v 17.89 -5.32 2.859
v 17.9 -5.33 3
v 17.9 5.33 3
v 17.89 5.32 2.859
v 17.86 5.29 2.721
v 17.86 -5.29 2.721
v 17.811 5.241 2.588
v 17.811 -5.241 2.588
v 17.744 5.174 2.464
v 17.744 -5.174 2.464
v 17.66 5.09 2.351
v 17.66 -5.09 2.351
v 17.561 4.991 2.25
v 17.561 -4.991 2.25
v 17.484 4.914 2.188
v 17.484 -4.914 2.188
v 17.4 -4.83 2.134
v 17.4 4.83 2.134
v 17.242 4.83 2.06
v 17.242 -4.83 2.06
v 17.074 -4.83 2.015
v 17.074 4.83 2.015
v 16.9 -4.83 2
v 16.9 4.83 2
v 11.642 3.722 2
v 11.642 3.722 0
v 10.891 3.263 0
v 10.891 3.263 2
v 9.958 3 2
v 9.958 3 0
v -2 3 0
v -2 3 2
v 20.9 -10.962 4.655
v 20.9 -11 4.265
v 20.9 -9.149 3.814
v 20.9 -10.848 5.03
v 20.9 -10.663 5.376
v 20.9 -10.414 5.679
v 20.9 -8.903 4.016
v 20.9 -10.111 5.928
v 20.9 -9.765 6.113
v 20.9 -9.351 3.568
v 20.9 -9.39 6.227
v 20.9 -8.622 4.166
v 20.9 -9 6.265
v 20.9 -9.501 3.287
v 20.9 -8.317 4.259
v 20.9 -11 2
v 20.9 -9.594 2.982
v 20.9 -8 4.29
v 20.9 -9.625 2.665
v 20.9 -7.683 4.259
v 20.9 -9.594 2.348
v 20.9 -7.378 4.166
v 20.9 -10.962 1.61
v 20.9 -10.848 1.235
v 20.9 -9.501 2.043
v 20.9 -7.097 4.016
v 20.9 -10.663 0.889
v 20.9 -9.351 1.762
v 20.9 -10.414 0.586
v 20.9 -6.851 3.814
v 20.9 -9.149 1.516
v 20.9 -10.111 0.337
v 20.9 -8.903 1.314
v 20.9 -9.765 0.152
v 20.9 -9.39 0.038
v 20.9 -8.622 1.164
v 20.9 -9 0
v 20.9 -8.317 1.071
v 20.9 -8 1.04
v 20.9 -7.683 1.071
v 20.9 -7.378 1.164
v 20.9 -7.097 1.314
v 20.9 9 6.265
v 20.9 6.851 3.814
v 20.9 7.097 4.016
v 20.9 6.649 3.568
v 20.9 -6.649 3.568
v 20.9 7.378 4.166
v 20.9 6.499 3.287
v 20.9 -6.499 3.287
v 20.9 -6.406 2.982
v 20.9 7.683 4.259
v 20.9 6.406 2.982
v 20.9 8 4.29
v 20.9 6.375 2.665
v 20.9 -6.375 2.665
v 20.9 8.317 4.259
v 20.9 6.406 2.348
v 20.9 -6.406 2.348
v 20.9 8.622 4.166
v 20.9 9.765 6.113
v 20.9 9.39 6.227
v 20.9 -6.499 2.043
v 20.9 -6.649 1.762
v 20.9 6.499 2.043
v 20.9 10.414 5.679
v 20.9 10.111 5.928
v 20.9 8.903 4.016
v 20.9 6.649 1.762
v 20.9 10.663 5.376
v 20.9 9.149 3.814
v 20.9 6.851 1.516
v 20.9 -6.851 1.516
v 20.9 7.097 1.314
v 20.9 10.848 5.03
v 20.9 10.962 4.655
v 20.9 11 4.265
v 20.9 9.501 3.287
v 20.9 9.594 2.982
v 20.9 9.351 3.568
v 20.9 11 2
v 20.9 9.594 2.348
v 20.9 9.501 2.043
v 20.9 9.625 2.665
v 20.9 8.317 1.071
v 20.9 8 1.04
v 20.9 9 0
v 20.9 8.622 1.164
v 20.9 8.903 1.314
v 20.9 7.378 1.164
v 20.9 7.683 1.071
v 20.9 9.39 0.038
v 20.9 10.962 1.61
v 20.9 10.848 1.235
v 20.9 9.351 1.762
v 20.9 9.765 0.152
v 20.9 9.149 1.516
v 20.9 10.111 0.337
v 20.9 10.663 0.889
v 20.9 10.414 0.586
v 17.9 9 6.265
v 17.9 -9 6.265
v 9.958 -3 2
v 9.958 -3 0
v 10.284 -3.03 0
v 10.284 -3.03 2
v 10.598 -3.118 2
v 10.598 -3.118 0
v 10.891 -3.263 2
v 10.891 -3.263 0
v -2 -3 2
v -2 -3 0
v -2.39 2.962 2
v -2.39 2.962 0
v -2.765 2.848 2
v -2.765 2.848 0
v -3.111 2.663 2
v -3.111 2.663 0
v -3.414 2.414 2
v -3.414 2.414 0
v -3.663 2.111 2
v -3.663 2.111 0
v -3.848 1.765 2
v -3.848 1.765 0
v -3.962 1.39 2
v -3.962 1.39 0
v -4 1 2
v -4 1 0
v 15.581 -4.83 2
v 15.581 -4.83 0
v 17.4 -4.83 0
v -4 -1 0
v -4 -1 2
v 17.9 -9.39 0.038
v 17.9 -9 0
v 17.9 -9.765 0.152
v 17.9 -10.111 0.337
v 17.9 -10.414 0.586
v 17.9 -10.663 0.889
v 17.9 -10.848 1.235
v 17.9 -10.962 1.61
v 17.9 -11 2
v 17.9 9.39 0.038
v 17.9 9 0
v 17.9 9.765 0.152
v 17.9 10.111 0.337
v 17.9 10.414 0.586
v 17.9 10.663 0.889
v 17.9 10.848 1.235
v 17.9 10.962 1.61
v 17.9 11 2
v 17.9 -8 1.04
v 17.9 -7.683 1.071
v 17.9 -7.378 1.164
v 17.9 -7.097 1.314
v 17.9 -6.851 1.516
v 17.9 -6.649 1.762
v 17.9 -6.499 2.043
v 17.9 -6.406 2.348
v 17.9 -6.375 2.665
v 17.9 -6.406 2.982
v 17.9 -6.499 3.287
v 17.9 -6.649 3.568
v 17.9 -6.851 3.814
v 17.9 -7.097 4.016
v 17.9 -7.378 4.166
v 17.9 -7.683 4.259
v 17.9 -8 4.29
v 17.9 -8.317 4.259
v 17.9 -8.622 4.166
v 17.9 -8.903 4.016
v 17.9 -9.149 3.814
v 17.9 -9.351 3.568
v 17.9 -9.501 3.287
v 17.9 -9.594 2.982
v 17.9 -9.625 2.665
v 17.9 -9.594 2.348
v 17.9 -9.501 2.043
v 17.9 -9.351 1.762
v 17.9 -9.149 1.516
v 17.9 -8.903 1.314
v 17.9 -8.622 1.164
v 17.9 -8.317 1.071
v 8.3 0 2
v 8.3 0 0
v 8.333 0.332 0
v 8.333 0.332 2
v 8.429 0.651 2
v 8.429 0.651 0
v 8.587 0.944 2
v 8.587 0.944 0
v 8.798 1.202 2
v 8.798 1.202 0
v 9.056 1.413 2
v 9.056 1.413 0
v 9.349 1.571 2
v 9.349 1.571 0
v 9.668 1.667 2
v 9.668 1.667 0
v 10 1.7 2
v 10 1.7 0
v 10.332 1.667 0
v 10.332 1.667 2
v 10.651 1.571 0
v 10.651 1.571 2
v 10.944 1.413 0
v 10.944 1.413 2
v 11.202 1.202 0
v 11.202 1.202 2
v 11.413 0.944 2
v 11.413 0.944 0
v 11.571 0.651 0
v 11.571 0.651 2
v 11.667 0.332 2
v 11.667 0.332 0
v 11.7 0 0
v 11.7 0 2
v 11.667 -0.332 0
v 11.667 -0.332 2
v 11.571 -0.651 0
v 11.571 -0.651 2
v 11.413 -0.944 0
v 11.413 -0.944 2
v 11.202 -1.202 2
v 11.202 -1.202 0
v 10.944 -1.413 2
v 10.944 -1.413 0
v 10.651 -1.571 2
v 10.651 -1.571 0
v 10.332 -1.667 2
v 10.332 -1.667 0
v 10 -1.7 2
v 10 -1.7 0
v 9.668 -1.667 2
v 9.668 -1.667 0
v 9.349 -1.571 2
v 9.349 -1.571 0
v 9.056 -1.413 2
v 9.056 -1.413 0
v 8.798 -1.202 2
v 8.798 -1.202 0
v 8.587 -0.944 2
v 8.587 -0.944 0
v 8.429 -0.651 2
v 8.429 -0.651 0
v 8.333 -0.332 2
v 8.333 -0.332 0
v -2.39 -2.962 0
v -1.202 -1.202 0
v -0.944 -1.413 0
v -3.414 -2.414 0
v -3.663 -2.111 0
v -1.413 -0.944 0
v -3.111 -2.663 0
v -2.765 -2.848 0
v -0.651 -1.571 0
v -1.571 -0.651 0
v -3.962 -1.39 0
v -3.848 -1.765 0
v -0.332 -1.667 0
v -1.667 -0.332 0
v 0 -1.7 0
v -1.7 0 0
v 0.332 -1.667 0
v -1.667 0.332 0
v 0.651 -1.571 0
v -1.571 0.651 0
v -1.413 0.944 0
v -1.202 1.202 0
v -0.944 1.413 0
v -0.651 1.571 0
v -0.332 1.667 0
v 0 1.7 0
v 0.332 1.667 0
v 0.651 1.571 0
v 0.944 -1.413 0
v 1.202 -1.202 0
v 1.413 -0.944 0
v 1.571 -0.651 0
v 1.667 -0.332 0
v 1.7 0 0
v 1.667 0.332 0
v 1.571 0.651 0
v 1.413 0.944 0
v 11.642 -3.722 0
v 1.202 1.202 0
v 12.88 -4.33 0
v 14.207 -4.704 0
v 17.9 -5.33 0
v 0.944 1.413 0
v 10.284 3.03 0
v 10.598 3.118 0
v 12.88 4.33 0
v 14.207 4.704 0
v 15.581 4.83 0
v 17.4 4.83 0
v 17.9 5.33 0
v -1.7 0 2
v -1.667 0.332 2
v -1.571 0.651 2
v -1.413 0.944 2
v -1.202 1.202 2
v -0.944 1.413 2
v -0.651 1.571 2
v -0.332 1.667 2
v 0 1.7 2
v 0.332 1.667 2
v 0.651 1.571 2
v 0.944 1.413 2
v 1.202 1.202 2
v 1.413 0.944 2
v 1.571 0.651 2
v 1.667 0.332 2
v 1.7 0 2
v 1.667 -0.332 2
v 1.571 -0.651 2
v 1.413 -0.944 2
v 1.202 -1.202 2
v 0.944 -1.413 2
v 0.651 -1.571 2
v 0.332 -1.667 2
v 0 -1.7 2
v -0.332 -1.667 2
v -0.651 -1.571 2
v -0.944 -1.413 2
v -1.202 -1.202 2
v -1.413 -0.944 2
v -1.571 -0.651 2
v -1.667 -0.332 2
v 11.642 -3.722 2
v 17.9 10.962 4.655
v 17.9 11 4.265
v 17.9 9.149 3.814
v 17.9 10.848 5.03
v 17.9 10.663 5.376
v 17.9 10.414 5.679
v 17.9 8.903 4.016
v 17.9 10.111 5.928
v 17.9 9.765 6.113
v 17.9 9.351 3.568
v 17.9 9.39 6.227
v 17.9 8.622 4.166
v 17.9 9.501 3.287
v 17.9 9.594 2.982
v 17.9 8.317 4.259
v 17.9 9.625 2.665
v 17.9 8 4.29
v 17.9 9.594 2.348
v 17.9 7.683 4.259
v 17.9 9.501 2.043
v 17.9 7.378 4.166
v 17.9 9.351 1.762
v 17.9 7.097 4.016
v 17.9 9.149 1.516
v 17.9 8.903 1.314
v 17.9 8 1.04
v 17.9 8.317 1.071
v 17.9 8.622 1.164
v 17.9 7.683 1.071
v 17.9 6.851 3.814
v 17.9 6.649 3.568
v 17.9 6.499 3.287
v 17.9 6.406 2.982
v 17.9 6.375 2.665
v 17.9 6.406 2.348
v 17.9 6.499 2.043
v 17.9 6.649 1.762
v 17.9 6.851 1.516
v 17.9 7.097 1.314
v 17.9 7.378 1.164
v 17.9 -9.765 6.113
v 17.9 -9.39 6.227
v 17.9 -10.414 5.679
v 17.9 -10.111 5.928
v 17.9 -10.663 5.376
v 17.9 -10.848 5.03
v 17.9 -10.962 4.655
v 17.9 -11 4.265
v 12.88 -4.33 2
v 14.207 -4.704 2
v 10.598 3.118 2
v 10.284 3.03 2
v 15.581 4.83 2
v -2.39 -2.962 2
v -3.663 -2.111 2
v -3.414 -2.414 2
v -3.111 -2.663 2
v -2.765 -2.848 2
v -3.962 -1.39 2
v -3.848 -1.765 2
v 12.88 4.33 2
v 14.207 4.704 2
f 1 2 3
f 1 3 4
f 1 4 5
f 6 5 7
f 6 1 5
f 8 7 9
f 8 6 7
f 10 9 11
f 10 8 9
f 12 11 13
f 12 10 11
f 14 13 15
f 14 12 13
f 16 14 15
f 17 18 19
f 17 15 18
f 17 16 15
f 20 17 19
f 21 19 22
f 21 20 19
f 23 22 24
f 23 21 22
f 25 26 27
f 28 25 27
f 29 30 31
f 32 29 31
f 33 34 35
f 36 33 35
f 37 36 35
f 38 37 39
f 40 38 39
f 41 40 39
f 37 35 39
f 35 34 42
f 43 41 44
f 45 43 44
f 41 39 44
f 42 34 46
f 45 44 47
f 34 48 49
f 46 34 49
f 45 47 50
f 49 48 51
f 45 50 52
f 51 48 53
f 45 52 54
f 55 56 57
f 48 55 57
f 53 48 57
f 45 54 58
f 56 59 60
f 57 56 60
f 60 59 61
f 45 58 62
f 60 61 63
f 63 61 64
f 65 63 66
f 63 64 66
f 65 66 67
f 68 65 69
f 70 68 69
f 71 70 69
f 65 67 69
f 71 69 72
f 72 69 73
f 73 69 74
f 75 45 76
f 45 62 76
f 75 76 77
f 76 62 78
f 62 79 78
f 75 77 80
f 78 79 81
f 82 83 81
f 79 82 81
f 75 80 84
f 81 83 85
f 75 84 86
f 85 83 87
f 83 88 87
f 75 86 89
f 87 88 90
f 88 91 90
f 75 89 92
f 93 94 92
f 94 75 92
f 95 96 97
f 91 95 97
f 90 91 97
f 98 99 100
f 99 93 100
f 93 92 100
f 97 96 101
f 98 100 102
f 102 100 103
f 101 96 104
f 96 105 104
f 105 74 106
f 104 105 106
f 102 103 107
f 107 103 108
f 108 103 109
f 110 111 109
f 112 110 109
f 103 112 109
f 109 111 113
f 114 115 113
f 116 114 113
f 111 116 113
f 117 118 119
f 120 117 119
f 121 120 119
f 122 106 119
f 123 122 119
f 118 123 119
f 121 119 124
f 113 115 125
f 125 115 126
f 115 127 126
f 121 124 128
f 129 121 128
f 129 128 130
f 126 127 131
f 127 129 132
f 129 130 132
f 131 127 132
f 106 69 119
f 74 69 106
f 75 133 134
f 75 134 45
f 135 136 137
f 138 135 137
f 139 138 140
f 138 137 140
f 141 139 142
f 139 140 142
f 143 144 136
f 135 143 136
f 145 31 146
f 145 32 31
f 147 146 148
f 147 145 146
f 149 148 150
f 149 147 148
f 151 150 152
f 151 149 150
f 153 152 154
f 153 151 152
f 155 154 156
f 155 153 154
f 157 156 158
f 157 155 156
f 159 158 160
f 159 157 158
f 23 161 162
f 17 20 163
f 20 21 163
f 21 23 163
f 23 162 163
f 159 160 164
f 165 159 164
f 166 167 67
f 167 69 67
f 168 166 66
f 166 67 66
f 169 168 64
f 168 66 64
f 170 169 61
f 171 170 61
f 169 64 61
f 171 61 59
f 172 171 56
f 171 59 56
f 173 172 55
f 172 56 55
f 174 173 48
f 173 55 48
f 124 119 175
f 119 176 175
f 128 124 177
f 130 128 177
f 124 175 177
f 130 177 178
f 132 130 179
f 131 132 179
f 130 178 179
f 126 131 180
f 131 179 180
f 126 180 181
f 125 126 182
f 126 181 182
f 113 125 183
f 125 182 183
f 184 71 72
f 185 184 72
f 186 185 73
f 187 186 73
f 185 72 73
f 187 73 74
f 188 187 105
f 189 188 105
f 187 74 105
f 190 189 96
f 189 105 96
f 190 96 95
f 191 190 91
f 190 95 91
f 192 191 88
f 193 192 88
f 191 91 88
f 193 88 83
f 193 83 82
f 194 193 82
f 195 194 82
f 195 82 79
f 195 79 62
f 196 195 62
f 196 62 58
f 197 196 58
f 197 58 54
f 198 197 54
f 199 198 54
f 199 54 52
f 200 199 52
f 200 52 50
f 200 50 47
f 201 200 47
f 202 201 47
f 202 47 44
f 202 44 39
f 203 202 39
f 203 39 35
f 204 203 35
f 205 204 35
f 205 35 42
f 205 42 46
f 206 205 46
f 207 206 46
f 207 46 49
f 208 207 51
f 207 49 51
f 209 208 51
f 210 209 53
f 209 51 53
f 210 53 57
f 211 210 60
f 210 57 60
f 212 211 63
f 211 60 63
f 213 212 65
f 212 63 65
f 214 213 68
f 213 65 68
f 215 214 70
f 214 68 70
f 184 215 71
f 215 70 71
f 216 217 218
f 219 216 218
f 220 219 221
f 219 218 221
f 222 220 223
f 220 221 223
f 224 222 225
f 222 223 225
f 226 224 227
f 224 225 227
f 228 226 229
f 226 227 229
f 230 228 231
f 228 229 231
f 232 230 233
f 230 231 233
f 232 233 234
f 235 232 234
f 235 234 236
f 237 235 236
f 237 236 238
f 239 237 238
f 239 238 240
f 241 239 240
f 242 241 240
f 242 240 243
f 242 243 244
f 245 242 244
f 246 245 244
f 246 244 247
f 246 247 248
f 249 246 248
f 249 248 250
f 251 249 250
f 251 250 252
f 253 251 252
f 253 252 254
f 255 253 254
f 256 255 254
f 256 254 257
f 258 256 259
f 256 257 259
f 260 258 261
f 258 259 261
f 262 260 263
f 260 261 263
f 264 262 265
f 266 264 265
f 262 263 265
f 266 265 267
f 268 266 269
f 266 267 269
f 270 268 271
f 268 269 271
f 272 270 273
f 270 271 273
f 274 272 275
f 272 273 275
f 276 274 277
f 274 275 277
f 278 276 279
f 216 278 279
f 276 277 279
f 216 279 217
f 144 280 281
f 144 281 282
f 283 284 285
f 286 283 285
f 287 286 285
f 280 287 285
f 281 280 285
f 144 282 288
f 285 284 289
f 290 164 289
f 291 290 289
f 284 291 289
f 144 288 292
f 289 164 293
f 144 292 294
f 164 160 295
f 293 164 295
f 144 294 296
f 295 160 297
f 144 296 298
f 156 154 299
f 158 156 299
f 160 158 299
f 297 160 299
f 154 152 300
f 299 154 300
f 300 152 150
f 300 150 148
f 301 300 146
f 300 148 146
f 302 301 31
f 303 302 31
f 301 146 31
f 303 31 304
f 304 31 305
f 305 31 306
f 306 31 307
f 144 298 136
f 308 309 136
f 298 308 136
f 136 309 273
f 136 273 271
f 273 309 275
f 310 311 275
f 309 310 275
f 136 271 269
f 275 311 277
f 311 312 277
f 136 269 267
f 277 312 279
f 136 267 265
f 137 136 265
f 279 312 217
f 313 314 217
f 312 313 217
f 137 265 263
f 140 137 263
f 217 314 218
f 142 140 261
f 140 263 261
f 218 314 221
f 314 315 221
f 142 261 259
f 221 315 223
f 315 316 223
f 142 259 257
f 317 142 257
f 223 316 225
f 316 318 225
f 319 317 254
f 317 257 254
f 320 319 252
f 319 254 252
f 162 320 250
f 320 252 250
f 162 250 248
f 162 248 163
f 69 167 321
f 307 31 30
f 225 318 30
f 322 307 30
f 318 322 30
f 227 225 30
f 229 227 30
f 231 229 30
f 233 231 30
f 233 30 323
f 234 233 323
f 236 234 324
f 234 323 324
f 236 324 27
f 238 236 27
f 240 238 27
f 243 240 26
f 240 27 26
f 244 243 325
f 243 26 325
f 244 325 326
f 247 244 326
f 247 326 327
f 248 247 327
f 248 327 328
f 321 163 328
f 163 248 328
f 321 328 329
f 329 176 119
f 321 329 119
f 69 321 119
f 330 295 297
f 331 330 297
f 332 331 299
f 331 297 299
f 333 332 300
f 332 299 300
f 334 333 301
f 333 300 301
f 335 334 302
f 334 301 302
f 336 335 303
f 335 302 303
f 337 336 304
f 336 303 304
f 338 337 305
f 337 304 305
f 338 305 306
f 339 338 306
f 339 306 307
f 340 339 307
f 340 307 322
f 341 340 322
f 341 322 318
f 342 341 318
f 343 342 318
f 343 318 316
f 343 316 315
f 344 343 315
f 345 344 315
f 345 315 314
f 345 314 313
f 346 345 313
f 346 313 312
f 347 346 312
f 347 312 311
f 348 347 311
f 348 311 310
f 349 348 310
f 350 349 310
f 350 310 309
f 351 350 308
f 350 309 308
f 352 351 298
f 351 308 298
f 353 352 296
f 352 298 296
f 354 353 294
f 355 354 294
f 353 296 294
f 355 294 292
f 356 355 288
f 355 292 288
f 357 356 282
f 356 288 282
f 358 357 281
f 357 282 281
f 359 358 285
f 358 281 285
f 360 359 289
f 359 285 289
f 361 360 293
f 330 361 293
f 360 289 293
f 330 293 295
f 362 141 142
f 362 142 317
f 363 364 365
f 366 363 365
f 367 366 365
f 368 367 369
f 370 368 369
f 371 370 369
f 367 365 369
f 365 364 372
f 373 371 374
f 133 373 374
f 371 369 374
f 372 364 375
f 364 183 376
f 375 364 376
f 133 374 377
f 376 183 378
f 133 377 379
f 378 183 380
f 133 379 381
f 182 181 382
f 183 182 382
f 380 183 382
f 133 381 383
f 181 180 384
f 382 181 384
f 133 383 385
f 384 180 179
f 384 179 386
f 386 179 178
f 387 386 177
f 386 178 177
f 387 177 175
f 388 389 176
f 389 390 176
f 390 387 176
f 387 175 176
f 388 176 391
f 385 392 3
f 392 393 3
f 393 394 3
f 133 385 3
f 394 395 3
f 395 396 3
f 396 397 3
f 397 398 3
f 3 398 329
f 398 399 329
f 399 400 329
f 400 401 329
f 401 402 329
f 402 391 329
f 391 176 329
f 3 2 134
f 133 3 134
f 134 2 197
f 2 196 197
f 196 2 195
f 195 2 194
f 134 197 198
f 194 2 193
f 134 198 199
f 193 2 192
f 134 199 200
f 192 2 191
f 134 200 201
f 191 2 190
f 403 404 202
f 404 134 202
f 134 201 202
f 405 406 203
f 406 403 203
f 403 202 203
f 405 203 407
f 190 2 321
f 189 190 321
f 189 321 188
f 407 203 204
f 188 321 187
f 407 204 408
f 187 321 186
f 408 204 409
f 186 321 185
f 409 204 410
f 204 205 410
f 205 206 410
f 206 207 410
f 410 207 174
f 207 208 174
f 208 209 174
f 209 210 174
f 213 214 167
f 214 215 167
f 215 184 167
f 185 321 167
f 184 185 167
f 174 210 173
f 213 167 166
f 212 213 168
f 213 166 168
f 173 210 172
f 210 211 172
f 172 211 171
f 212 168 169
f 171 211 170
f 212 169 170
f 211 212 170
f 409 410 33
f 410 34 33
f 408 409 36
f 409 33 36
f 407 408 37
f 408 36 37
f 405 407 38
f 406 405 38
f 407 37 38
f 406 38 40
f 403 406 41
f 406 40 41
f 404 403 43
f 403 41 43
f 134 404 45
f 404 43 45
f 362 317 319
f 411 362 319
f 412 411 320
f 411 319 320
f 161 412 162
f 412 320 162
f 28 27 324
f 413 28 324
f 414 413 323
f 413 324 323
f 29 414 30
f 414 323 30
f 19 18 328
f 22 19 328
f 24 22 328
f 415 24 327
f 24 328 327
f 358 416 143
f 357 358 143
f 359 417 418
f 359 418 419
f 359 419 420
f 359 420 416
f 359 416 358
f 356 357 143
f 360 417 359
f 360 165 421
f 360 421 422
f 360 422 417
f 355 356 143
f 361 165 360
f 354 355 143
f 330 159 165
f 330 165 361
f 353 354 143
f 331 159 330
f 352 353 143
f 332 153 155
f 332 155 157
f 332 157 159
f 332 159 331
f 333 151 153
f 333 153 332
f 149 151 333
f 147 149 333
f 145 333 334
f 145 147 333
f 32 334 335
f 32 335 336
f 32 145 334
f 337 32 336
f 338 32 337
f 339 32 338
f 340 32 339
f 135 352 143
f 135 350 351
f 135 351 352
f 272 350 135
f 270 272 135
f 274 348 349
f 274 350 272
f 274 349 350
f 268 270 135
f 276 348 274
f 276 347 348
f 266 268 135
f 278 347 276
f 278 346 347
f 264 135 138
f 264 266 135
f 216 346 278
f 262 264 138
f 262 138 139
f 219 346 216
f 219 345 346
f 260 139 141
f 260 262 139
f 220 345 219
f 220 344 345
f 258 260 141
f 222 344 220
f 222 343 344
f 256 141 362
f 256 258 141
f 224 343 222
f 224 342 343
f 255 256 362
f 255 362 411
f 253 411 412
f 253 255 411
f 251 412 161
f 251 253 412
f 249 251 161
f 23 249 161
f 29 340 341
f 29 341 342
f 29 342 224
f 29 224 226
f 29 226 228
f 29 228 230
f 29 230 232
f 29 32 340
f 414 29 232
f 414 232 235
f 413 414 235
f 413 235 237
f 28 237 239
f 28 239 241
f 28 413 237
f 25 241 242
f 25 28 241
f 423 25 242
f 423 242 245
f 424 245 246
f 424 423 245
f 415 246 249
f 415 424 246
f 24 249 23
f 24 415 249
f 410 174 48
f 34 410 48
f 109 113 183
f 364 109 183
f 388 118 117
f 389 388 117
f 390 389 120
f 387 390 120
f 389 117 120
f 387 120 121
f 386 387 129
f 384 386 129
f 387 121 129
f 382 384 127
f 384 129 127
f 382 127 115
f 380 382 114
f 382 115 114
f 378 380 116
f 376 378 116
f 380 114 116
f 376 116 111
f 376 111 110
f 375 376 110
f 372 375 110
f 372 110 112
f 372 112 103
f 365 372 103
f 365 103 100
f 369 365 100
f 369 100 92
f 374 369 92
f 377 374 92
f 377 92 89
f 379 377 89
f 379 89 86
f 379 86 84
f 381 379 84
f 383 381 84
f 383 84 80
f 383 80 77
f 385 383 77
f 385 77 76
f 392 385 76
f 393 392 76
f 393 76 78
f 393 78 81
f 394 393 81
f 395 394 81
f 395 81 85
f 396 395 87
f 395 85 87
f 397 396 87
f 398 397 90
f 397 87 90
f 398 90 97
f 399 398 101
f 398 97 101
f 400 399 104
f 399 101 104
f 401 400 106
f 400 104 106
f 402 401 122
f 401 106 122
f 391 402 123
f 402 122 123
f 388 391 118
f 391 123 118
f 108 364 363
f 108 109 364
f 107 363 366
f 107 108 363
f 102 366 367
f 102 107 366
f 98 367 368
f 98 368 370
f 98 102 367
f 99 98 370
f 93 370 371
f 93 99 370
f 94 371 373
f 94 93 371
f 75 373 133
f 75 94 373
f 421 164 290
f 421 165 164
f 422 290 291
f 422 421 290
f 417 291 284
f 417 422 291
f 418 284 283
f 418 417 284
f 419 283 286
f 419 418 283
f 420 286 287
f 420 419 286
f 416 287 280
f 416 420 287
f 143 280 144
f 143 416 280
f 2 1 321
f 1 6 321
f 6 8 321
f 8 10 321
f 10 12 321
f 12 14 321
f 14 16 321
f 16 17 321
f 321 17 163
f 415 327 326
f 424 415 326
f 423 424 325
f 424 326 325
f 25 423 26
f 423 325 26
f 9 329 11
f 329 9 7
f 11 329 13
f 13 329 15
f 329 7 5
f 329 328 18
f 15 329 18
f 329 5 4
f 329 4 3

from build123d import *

# Parameters (mm, degrees)
BOSS_EXTRUDE1_DEPTH  = 2
SKETCH1_3_W          = 3
SKETCH1_3_H          = 22
BOSS_EXTRUDE2_DEPTH  = 6.265
M3_CLEARANCE_HOLE1_D = 3.4
FILLET1_R            = 2
SKETCH6_R            = 1.625
CUT_EXTRUDE1_DEPTH   = 7.5
FILLET2_R            = 1
CHAMFER1_SIZE        = 0.5


with BuildPart() as part:
    # Sketch1 → Boss-Extrude1 (new body)
    with BuildSketch(Plane.XY):
        with BuildLine():
            Line((9.958333406, 3), (-4, 3))
            Line((-4, 3), (-4, -3))
            Line((-4, -3), (9.958333406, -3))
            ThreePointArc((9.958333406, -3), (10.44298868, -3.066896425), (10.891399918, -3.262582978))
            Line((10.891399918, -3.262582978), (11.642445292, -3.721657662))
            ThreePointArc((11.642445292, -3.721657662), (13.535102515, -4.547612803), (15.580738809, -4.829969693))
            Line((15.580738809, -4.829969693), (17.9, -4.829969693))
            Line((17.9, -4.829969693), (17.9, 4.829969693))
            Line((17.9, 4.829969693), (15.580738809, 4.829969693))
            ThreePointArc((15.580738809, 4.829969693), (13.535102515, 4.547612803), (11.642445292, 3.721657662))
            Line((11.642445292, 3.721657662), (10.891399918, 3.262582978))
            ThreePointArc((10.891399918, 3.262582978), (10.44298868, 3.066896425), (9.958333406, 3))
        make_face()
        Polygon((17.9, 11), (17.9, 4.829969693), (17.9, -4.829969693), (17.9, -11), (20.9, -11), (20.9, 11), align=None)
    extrude(amount=BOSS_EXTRUDE1_DEPTH)

    # Sketch1<3> → Boss-Extrude2 (add)
    with BuildSketch(Plane.XY):
        with Locations((19.4, 0)):
            Rectangle(SKETCH1_3_W, SKETCH1_3_H)
    extrude(amount=BOSS_EXTRUDE2_DEPTH)

    # M3 Clearance Hole1 (through all)
    with Locations(Plane.XY.offset(2)):
        with Locations((0, 0), (10, 0)):
            Hole(M3_CLEARANCE_HOLE1_D / 2)

    # Fillet1
    fillet1_edges = [part.edges().sort_by_distance(p)[0] for p in [
        (19.4, 11, 0),
        (19.4, -11, 0),
        (-4, -3, 1),
        (-4, 3, 1),
        (19.4, -11, 6.265),
        (19.4, 11, 6.265),
    ]]
    fillet(fillet1_edges, radius=FILLET1_R)

    # Sketch6 → Cut-Extrude1 (cut)
    with BuildSketch(Plane(origin=(20.9, 0, 0), x_dir=(0, 0, -1), z_dir=(1, 0, 0))):
        with Locations((-2.665, -8)):
            Circle(SKETCH6_R)
        with Locations((-2.665, 8)):
            Circle(SKETCH6_R)
    extrude(amount=-CUT_EXTRUDE1_DEPTH, mode=Mode.SUBTRACT)

    # Fillet2
    fillet2_edges = [part.edges().sort_by_distance(p)[0] for p in [
        (17.9, 0, 2),
    ]]
    fillet(fillet2_edges, radius=FILLET2_R)

    # Chamfer1
    chamfer1_edges = [part.edges().sort_by_distance(p)[0] for p in [
        (17.9, 4.829969693, 1),
        (17.9, -4.829969693, 1),
    ]]
    chamfer(chamfer1_edges, length=CHAMFER1_SIZE)


solid = part.part
